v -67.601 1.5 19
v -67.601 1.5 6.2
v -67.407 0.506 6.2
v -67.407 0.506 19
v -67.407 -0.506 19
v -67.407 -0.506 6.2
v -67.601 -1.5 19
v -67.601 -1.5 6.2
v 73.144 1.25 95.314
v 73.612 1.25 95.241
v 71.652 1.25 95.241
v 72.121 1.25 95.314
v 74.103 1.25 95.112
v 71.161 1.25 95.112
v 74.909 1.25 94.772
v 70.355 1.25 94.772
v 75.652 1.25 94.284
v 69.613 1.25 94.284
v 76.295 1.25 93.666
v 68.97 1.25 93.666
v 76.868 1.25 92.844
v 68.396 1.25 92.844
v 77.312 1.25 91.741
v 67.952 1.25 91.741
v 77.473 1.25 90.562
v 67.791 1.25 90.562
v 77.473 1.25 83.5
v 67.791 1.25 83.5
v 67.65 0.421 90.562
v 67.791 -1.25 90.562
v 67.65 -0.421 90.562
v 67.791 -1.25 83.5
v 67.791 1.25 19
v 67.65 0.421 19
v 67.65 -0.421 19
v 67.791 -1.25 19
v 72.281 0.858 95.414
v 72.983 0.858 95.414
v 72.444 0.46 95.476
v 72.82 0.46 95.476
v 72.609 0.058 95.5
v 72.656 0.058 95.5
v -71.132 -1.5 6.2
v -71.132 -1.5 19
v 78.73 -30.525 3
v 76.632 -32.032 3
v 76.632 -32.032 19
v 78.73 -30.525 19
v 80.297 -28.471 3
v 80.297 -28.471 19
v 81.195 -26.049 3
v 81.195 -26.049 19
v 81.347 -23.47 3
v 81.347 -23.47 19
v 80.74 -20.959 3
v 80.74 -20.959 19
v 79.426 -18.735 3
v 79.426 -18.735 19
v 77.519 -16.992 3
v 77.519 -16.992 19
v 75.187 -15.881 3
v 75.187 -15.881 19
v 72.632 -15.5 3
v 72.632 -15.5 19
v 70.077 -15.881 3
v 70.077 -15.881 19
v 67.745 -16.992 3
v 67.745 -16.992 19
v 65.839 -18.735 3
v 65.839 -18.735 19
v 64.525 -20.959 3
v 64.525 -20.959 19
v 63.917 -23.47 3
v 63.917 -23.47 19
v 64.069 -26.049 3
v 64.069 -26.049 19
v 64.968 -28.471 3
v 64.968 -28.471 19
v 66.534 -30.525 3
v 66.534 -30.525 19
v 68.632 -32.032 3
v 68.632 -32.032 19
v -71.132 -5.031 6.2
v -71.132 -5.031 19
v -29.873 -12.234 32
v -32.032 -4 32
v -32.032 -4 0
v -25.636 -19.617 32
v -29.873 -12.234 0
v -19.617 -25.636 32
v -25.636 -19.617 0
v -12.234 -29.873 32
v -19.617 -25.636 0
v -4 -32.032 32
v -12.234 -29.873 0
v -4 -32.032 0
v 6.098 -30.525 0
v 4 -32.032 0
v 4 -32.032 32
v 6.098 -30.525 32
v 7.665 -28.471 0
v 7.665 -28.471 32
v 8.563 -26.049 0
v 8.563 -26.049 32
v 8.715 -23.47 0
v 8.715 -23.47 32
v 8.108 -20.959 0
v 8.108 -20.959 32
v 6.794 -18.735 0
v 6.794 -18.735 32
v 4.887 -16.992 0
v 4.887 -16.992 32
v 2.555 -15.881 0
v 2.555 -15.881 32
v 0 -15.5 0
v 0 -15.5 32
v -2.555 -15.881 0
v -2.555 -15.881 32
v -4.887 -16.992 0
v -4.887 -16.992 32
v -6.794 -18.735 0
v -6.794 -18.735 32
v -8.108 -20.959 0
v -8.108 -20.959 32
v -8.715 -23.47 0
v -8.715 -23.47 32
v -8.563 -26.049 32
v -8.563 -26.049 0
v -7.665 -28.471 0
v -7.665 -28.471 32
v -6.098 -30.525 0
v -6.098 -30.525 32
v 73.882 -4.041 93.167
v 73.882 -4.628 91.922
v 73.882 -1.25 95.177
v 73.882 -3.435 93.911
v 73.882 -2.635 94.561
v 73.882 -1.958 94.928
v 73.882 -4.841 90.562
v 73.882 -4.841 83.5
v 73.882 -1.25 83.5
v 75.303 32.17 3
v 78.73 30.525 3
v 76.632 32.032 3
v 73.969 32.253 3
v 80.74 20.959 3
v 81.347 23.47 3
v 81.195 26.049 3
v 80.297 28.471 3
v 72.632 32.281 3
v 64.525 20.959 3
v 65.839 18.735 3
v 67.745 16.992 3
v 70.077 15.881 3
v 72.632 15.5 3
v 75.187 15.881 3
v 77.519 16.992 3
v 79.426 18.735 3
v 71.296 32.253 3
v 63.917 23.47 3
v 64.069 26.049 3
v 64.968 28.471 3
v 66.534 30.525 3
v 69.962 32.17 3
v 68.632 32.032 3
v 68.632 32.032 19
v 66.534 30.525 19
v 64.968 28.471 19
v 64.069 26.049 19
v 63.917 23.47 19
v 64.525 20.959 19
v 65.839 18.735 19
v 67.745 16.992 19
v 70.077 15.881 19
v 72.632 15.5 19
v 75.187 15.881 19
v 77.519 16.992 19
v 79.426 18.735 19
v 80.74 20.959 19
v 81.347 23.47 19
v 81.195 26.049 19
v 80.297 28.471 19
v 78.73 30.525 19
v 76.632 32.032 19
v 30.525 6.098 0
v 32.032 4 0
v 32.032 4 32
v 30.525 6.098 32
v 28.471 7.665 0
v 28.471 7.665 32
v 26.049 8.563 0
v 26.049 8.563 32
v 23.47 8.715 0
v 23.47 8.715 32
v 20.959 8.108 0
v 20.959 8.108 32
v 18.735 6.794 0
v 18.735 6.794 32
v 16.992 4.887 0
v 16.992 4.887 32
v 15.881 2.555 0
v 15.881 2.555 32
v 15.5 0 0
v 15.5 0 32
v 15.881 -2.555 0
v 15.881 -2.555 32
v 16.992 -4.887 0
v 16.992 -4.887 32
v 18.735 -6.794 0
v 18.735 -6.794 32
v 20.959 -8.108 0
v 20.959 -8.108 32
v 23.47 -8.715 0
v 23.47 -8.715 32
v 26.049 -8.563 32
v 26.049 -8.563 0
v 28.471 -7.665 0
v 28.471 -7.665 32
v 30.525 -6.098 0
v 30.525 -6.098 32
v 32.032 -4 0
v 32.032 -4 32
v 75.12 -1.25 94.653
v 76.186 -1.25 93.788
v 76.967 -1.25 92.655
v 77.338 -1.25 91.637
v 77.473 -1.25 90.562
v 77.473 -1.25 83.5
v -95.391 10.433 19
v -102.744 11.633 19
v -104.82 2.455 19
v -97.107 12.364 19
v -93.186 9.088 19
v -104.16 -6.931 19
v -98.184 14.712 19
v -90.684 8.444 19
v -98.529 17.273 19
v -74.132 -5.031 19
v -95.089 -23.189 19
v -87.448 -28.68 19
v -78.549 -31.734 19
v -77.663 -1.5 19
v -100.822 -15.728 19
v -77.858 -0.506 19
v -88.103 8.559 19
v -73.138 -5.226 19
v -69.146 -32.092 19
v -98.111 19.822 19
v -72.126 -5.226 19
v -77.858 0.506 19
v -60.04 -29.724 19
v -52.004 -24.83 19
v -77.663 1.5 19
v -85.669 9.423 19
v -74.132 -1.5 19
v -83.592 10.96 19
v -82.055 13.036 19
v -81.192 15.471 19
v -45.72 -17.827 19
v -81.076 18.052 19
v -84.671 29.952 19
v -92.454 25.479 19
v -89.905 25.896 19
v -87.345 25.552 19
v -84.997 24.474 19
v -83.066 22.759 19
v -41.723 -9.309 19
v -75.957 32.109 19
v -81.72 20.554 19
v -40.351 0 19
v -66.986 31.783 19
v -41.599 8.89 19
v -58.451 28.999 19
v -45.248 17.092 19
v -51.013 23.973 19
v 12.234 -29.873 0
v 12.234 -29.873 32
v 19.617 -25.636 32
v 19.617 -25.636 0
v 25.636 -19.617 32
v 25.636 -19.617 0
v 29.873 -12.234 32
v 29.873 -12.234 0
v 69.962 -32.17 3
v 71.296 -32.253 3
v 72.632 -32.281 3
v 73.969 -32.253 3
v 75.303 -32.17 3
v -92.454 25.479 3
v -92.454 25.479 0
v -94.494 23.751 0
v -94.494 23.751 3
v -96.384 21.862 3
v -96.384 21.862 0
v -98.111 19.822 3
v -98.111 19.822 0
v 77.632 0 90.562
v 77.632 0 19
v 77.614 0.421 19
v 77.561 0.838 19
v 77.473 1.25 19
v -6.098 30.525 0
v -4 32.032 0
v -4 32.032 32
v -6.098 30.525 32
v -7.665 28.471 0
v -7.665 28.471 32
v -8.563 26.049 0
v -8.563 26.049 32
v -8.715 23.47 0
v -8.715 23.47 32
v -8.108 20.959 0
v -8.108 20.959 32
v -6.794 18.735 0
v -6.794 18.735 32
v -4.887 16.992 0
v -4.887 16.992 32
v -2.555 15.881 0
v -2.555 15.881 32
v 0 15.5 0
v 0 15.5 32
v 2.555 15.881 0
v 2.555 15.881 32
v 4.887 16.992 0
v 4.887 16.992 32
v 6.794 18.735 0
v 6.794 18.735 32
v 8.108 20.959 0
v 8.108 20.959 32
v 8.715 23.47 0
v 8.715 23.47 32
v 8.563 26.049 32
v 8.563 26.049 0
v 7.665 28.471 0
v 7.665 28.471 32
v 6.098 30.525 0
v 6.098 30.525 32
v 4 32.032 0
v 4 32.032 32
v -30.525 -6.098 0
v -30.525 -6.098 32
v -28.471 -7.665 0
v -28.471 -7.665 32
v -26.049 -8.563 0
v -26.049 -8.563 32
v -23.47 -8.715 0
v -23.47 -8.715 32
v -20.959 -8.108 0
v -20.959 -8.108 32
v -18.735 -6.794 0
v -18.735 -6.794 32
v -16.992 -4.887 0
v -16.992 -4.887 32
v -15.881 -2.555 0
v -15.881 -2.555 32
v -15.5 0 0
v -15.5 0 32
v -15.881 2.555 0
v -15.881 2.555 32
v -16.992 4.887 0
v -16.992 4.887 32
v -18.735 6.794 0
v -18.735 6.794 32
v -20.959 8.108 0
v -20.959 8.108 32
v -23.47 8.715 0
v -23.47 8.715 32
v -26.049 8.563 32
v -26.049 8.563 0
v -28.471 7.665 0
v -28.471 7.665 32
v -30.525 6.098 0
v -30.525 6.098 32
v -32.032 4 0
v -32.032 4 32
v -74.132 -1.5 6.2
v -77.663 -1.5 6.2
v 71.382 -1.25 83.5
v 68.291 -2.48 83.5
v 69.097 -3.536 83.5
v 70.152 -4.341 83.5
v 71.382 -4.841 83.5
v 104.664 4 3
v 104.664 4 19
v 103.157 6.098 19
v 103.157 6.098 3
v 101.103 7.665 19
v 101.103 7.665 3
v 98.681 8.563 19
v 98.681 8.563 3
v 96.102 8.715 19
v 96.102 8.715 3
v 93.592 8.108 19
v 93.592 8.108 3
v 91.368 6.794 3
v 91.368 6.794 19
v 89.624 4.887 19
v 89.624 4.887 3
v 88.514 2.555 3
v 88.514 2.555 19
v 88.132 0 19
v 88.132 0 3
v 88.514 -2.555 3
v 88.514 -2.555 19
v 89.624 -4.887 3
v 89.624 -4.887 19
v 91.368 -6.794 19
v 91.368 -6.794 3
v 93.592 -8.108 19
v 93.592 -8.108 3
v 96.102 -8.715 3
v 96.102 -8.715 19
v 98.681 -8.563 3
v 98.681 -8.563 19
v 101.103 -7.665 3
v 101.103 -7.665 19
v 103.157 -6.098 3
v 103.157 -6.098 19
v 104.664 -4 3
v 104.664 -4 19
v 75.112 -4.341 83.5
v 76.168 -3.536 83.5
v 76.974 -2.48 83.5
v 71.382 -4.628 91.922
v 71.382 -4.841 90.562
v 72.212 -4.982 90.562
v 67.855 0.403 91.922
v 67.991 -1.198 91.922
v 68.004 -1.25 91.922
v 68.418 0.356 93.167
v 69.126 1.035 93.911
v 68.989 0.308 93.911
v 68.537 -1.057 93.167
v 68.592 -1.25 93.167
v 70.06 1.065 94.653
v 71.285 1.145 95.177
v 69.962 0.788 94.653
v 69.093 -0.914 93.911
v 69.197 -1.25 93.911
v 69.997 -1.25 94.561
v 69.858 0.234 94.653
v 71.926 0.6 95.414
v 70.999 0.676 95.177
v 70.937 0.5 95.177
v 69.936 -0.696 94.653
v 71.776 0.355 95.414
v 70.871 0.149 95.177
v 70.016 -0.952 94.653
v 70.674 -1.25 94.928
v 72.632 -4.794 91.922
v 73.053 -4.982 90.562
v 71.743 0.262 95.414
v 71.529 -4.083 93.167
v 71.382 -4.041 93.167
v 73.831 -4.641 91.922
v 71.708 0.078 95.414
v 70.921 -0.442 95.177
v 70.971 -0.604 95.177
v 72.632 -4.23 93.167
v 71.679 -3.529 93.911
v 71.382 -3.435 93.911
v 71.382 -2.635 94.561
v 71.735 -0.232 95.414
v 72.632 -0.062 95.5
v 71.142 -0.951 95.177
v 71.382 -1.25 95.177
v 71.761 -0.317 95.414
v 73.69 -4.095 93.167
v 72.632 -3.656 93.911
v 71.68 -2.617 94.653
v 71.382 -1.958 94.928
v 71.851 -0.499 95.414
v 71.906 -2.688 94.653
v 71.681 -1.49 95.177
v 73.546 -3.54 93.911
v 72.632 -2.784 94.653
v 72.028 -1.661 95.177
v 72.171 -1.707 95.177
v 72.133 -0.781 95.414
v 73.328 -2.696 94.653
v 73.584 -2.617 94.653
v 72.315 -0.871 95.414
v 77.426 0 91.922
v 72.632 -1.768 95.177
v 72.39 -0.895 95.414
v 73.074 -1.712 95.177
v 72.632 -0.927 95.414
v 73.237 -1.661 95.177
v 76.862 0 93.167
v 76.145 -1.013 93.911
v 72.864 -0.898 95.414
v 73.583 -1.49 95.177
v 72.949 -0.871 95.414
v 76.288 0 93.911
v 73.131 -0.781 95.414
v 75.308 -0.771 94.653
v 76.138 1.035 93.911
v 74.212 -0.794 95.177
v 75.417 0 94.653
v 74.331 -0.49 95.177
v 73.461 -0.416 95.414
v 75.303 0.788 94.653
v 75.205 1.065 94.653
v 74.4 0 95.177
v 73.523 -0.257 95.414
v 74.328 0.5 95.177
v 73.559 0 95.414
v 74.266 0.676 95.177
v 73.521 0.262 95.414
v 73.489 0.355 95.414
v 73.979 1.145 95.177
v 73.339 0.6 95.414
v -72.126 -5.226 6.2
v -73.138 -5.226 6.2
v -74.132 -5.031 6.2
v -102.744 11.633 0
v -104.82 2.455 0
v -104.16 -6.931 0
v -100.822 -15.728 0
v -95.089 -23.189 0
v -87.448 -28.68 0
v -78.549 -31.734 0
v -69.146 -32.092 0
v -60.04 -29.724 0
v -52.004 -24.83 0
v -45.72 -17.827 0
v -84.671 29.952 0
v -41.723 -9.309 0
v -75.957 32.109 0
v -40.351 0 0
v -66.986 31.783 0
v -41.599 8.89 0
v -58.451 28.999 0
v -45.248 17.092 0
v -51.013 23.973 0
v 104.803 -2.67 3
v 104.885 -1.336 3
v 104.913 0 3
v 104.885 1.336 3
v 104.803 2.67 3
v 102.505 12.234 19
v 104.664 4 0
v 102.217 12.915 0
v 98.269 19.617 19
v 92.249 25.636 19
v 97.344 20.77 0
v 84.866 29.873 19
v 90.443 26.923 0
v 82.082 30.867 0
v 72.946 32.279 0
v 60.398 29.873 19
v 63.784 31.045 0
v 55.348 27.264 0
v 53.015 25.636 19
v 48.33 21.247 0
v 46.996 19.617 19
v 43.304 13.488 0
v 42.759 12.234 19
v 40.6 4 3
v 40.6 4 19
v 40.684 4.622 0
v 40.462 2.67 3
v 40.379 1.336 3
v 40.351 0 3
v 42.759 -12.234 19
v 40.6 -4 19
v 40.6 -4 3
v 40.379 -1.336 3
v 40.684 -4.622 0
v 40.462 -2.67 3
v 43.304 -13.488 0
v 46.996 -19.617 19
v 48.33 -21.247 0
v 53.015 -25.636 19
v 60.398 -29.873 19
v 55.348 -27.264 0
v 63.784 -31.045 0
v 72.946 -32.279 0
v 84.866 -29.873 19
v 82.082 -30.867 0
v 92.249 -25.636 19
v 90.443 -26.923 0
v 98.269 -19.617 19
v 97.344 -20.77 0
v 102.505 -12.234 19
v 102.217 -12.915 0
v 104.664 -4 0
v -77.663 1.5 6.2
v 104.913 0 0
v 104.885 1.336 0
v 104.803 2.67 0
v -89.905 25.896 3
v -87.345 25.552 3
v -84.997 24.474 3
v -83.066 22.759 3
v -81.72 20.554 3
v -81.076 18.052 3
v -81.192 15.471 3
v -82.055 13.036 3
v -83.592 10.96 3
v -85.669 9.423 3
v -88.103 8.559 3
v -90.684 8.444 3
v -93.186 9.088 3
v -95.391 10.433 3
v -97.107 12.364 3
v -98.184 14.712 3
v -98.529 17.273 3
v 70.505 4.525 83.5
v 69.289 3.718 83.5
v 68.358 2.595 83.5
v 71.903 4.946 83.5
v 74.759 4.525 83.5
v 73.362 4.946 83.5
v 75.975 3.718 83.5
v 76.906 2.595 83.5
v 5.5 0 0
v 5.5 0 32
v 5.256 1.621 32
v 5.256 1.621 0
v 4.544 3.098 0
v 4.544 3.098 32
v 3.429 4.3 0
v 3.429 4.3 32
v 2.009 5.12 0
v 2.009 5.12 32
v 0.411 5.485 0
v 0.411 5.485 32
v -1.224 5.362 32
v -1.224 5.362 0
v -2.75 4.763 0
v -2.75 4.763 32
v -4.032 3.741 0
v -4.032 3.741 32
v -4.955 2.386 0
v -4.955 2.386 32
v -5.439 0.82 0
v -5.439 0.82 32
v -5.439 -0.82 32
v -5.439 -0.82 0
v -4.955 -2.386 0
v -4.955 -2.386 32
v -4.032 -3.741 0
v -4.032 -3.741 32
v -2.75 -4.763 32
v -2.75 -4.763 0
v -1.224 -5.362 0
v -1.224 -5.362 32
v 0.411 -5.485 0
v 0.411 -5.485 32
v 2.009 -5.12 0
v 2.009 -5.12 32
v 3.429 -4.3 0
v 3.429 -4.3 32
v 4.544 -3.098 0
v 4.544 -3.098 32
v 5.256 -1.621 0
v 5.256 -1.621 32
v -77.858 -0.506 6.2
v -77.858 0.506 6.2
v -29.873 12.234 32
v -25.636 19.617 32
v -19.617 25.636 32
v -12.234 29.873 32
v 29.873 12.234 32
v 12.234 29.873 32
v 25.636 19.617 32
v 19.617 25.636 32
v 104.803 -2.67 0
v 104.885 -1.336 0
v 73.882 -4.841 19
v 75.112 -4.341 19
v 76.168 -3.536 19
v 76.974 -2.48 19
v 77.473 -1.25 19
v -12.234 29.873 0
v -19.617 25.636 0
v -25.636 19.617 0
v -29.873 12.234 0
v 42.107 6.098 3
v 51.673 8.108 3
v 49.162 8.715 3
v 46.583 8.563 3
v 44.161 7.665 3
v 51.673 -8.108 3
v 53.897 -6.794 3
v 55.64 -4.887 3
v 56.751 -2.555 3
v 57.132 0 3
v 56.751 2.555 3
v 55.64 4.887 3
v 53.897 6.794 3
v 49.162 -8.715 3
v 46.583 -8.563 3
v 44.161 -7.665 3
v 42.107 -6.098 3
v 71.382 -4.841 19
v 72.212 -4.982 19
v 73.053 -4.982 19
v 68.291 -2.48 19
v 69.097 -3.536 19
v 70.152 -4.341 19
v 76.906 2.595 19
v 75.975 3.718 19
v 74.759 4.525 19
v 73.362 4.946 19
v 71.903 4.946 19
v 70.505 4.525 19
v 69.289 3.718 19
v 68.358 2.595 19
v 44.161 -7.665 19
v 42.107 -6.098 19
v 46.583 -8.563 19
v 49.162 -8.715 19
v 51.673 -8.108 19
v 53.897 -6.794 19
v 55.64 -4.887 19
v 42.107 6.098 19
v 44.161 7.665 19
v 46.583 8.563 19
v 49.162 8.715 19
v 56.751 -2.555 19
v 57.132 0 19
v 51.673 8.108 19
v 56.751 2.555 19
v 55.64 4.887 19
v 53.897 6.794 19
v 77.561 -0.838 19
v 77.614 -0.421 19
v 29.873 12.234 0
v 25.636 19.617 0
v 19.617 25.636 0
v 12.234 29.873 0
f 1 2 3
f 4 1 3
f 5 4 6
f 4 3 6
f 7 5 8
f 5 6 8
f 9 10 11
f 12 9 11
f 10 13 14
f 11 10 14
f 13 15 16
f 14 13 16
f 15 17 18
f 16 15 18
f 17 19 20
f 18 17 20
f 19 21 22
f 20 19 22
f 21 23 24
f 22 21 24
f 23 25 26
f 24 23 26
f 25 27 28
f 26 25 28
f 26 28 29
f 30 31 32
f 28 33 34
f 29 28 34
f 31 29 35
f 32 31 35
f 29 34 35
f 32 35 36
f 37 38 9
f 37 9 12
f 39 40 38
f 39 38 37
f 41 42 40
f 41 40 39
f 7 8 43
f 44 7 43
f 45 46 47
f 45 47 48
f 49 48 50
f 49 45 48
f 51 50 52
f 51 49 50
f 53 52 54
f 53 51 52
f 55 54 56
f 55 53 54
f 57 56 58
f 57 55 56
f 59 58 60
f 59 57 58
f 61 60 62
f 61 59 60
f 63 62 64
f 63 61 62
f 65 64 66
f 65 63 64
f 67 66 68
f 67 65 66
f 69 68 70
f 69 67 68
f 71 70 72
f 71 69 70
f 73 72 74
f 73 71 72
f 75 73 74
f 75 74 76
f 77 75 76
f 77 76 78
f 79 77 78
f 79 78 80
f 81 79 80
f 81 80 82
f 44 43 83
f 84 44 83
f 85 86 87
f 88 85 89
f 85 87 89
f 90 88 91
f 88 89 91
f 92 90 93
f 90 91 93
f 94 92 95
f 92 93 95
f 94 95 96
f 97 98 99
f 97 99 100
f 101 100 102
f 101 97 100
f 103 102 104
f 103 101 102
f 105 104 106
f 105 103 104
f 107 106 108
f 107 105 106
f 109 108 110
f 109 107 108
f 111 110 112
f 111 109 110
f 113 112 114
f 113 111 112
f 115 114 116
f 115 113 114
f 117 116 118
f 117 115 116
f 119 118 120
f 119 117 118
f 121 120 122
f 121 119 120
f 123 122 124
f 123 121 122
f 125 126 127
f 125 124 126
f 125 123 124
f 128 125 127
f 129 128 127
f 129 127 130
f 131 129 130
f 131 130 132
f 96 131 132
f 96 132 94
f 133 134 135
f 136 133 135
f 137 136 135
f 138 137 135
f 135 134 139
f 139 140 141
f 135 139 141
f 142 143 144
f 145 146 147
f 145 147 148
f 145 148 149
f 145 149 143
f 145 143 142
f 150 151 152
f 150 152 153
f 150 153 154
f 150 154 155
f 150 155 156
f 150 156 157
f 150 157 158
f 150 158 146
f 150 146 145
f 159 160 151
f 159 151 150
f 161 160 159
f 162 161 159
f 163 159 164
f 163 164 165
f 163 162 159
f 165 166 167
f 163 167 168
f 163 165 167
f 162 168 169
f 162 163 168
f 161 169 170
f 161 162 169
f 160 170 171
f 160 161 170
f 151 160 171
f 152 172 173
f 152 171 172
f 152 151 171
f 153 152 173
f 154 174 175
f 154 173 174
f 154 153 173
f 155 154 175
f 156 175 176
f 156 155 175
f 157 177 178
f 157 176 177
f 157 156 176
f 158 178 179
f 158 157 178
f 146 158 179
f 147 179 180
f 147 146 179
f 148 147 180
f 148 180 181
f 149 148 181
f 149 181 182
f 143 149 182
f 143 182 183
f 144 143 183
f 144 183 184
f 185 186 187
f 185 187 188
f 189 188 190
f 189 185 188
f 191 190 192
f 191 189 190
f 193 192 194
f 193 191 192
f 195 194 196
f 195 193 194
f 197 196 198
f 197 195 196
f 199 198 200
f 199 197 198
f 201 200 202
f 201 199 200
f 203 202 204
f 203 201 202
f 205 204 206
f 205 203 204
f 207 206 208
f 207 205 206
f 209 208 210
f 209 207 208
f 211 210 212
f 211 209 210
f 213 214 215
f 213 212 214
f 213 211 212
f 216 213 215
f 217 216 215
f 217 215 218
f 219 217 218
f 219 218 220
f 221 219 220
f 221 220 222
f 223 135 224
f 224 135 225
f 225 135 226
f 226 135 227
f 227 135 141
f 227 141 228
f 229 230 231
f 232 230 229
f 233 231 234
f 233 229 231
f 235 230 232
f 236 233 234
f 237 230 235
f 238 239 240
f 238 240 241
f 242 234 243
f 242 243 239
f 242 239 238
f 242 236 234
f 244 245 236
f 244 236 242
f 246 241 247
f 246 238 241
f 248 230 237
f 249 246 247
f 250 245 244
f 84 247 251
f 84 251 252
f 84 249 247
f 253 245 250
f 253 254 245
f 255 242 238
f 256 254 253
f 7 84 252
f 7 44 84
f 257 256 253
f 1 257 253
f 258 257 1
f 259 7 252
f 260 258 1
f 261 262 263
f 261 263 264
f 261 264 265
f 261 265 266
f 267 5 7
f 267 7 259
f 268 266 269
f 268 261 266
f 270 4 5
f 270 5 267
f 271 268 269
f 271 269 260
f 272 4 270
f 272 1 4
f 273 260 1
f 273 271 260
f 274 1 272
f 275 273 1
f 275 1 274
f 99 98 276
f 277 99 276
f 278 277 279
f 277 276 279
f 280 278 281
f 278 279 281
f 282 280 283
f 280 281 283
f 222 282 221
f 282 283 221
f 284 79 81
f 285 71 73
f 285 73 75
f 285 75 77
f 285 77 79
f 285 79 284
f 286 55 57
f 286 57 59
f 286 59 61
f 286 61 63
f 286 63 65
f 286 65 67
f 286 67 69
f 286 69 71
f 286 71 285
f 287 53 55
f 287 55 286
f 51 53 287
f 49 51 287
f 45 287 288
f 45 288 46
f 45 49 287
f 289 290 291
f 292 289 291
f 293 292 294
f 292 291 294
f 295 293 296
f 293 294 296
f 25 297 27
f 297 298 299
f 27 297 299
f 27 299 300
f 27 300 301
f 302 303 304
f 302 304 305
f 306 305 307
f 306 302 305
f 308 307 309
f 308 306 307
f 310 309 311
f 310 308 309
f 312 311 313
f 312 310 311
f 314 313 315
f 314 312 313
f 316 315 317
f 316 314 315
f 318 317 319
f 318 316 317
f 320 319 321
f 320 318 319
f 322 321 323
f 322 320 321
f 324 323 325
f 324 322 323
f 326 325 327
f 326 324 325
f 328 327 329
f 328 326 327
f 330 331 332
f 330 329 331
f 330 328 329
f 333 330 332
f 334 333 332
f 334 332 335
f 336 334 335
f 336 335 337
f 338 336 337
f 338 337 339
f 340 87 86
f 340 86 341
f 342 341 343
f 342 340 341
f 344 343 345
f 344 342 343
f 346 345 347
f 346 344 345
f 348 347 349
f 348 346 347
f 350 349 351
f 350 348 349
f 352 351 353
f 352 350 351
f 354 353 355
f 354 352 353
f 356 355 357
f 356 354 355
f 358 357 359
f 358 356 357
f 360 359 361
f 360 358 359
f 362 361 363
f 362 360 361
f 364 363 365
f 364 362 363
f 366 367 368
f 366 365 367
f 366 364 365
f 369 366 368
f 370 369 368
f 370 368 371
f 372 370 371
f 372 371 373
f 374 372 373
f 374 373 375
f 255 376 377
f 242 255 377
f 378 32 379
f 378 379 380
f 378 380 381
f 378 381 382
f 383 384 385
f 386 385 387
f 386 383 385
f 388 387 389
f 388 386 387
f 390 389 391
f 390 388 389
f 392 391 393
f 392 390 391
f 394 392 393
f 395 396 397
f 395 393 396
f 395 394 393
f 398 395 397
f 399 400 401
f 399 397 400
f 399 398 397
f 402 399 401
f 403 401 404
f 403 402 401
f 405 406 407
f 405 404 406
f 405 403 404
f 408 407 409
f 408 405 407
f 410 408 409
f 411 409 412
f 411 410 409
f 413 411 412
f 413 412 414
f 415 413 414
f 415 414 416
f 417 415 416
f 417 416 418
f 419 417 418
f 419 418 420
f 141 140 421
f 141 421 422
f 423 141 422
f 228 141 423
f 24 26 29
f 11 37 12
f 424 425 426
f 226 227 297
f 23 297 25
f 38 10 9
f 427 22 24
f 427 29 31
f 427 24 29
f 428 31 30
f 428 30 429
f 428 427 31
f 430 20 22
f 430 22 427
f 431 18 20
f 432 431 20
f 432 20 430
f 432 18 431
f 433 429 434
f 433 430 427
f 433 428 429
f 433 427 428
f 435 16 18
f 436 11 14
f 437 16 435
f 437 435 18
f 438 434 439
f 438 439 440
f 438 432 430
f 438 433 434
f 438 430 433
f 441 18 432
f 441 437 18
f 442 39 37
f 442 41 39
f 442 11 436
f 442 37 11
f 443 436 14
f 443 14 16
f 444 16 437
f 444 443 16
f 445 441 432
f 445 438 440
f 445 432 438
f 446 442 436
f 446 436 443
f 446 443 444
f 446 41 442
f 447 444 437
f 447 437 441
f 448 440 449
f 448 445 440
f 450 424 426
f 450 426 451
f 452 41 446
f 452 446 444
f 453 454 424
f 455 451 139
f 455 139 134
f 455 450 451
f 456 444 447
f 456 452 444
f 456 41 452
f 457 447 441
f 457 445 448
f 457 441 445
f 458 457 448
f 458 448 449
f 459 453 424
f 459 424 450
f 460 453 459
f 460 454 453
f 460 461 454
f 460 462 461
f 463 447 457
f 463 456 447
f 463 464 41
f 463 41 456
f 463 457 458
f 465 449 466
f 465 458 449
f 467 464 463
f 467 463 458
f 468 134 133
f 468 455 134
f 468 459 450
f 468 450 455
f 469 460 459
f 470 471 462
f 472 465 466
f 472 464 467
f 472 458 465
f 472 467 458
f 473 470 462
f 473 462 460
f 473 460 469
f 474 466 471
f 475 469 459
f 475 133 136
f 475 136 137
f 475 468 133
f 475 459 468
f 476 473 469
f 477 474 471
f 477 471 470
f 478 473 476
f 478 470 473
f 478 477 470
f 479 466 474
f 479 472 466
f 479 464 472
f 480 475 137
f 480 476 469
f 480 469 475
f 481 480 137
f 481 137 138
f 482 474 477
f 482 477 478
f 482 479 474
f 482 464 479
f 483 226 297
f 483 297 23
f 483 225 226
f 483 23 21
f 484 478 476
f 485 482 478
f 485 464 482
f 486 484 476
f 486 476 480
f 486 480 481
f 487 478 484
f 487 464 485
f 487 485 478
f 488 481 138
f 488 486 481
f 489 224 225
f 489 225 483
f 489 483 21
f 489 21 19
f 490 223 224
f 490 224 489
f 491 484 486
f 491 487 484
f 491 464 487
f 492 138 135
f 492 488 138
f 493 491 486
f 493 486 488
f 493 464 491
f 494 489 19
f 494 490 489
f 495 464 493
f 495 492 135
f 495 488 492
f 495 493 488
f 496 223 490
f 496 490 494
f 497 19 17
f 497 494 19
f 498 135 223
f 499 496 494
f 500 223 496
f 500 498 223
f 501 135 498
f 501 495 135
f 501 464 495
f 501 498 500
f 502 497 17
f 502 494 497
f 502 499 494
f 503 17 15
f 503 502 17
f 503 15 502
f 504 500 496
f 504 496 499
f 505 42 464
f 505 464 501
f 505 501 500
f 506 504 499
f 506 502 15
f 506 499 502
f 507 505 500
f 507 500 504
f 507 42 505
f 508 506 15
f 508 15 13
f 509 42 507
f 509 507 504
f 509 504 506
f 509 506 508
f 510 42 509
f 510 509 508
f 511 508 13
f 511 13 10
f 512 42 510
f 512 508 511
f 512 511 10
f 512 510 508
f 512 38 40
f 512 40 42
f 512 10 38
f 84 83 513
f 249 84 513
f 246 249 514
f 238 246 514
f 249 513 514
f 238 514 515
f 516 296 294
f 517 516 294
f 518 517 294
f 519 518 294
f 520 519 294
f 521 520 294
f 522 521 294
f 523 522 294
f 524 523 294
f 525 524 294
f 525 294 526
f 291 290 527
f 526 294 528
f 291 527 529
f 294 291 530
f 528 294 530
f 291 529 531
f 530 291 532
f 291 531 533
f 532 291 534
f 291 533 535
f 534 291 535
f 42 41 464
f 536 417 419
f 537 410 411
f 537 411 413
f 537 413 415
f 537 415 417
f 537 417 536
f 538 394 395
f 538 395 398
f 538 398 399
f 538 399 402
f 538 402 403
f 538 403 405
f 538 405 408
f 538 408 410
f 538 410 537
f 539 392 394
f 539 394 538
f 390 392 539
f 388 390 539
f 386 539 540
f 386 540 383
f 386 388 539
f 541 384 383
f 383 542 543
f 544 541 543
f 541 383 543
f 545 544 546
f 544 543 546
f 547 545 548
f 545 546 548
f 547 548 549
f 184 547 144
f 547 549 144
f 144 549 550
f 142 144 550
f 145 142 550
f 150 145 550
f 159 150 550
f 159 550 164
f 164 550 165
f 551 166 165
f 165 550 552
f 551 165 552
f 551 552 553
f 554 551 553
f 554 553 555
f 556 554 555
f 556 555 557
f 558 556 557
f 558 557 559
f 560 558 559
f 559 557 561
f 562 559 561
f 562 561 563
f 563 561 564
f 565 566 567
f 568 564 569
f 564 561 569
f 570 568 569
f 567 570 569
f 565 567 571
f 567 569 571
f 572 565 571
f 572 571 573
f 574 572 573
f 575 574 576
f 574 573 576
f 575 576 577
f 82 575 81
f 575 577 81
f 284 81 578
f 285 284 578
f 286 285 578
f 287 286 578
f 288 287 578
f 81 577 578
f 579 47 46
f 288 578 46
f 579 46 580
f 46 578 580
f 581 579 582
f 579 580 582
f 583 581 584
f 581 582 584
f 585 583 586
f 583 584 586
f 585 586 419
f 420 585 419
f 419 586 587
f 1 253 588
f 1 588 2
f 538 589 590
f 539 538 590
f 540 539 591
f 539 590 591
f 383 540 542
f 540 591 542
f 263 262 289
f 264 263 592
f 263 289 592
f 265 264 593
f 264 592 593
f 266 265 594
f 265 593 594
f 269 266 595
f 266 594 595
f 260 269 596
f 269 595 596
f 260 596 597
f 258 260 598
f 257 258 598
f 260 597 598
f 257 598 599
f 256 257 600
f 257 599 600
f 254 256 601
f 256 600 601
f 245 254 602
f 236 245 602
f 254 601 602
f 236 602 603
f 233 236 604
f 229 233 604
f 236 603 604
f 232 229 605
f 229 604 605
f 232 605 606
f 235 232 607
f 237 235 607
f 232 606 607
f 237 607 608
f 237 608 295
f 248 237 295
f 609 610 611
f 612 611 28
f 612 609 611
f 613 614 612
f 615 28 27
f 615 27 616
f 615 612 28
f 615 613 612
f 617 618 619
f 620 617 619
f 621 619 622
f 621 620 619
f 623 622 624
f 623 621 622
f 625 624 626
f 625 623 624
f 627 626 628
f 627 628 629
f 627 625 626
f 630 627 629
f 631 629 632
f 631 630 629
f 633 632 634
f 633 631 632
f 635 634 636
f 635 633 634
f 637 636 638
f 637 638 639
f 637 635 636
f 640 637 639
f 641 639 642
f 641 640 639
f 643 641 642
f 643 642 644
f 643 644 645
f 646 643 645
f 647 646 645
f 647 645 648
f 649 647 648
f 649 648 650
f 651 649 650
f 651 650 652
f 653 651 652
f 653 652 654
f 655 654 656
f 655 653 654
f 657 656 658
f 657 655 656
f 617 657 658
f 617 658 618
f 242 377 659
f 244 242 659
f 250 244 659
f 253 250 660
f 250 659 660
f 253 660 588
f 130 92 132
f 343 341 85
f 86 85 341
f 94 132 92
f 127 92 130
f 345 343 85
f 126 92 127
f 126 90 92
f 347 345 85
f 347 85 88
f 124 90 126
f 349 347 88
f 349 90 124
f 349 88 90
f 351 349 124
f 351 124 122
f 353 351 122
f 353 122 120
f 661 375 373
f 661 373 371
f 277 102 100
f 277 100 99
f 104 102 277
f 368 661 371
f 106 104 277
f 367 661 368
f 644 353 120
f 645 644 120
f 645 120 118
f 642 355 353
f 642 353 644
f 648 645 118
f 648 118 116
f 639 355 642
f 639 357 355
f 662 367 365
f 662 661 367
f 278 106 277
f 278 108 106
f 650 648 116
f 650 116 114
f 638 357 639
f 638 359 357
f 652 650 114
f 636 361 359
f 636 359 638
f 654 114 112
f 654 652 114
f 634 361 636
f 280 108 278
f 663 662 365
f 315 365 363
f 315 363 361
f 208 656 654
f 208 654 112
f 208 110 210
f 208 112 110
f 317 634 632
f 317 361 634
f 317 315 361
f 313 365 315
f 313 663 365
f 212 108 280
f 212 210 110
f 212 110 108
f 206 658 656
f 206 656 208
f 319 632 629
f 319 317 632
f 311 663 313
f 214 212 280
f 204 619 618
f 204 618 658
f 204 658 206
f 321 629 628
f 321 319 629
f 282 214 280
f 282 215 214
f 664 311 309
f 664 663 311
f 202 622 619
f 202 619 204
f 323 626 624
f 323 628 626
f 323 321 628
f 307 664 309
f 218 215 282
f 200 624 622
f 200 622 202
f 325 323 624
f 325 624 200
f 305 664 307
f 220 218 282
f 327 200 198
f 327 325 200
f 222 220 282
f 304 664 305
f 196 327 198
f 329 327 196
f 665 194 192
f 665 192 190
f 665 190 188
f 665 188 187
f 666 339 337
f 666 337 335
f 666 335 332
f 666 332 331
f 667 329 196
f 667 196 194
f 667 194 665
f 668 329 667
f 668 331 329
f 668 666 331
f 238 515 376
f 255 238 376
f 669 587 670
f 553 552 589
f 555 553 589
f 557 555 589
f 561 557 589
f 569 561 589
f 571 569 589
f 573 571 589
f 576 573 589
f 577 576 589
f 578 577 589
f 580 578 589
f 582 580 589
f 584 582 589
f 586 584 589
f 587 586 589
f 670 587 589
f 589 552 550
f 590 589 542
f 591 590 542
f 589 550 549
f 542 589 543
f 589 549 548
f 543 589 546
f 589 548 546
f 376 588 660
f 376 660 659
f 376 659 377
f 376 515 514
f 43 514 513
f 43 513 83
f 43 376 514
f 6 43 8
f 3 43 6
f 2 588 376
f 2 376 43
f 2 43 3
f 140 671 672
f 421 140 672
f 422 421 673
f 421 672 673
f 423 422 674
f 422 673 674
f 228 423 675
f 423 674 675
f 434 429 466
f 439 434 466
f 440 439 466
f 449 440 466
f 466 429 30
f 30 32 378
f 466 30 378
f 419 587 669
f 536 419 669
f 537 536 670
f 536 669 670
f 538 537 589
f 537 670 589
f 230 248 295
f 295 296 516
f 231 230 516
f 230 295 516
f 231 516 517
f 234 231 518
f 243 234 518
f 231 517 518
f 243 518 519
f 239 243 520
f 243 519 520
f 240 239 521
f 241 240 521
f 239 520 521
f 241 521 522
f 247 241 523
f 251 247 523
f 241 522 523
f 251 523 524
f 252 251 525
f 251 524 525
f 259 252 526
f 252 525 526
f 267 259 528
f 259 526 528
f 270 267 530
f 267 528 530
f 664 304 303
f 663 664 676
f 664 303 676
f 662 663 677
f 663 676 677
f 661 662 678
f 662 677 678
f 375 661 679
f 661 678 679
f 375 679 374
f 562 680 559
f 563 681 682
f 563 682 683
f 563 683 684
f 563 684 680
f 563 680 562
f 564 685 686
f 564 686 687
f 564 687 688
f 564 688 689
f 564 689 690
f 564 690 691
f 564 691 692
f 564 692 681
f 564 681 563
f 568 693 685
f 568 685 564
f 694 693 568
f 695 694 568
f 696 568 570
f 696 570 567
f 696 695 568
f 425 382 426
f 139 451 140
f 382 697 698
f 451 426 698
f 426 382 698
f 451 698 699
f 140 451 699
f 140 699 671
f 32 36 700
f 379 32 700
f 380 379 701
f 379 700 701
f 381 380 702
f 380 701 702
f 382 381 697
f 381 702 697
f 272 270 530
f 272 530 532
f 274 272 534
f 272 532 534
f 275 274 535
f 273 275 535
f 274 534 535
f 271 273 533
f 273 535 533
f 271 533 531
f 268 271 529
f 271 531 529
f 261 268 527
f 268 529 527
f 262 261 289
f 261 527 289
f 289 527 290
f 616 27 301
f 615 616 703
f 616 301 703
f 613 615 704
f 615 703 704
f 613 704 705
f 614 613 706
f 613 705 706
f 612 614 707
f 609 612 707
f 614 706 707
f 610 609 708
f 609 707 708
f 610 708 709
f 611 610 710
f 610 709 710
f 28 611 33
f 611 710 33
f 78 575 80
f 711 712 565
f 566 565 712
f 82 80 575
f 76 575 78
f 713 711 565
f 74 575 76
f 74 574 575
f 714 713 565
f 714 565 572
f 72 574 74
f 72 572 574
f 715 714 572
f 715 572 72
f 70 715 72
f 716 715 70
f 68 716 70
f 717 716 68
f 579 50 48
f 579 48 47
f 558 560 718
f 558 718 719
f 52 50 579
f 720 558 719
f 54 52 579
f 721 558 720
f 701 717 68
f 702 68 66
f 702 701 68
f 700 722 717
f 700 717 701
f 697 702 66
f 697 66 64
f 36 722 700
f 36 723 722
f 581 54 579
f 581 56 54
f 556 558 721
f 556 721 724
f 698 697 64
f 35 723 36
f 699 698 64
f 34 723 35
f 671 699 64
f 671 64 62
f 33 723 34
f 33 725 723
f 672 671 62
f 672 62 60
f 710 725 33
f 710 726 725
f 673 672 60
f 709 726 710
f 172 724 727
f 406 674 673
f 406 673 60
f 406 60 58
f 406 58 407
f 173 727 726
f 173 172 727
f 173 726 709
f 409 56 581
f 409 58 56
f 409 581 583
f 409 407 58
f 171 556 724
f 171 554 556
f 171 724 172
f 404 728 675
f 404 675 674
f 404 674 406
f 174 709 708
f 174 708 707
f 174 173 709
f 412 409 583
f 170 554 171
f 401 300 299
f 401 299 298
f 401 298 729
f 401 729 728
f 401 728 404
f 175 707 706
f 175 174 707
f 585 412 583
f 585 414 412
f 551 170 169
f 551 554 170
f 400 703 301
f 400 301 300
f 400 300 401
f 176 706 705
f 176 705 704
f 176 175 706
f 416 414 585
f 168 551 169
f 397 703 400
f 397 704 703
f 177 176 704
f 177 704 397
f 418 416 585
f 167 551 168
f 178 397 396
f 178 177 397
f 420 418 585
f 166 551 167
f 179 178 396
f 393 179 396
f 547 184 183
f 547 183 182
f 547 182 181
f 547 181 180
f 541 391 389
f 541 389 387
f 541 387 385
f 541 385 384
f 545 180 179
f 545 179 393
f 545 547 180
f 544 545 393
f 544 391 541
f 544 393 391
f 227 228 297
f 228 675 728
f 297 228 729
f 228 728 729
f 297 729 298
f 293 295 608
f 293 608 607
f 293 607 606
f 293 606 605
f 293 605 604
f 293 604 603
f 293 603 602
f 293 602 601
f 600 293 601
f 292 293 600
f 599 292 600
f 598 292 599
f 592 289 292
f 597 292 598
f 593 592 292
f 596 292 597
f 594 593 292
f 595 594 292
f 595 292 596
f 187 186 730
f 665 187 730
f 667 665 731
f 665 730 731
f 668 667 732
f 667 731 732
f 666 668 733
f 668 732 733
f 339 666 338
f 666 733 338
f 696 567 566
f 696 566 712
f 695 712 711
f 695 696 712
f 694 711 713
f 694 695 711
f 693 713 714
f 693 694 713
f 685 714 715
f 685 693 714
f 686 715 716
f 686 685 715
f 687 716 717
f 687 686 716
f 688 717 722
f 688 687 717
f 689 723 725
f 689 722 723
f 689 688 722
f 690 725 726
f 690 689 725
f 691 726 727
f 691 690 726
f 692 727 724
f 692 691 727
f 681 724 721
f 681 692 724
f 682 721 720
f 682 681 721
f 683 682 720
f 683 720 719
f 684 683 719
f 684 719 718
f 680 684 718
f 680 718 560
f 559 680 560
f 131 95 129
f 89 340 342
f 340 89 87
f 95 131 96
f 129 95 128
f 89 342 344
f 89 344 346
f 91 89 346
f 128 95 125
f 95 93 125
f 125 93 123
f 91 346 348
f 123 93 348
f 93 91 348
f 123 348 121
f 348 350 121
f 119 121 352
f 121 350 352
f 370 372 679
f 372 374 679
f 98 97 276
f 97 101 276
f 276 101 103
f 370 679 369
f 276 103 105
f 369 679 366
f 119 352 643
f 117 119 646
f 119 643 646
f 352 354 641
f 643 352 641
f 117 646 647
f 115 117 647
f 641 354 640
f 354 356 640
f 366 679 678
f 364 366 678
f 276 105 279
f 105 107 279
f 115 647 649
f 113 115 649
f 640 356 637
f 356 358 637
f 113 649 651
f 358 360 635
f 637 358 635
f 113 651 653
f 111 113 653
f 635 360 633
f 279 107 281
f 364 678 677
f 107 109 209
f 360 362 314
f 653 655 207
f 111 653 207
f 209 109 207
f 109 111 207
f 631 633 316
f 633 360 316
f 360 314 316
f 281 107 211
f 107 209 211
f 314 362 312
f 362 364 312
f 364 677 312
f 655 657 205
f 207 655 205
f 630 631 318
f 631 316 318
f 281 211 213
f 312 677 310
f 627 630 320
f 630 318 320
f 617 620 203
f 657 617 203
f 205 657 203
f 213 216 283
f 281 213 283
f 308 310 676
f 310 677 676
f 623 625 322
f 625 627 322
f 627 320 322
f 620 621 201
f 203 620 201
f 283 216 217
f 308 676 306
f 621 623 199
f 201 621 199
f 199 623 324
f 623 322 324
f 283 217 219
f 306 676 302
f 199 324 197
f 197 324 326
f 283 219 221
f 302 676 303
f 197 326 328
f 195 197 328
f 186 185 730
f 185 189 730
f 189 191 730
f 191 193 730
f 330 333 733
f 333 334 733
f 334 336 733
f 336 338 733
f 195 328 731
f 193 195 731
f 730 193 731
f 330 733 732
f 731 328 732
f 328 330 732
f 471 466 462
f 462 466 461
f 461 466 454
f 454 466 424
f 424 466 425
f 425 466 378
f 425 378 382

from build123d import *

# Parameters (mm, degrees)
F3_R             = 5.5
F6_DEPTH         = 32
F7_DEPTH         = 32.001
F7_COPIES_COUNT  = 4
F8_DEPTH         = 19
F9_DEPTH         = 95.5
F10_DEPTH        = 83.5
F11_T2_ANGLE     = 315.5011633423
F11_T4_ANGLE     = 315.5011633423
F11_T6_ANGLE     = 315.5011633423
F12_START        = 3
F12_DEPTH        = 92.5010001001
F12_COPIES_COUNT = 4
F13_START        = 3
F13_DEPTH        = 92.5010001001
F14_DEPTH        = 19
F15_DEPTH        = 6.2
F16_DEPTH        = 3


# Not quite as in the source:
# - a fillet or chamfer that OpenCascade refuses, or shapes differently, is made with other operations: its cross-section is extruded or revolved along the edge and cut away or added
# - a pattern or mirror of a feature is missing from the dataset's text; its kind, count and spacing are read off the source's solid
# - a feature names something its author has since deleted; it is built from what else it names


with BuildPart() as f6:
    # F3 (on Top) → F6 (new body)
    with BuildSketch(Plane.XY):
        with BuildLine():
            ThreePointArc((32.0321912081, -4), (15.5, 0), (32.0321912081, 4))
            ThreePointArc((32.0321912081, 4), (-32.2809738638, 0), (32.0321912081, -4))
        make_face()
        Circle(F3_R, mode=Mode.SUBTRACT)
        with BuildLine():
            ThreePointArc((32.2809738638, 0), (32.218718168, 2.0038645669), (32.0321912081, 4))
            ThreePointArc((32.0321912081, 4), (15.5, 0), (32.0321912081, -4))
            ThreePointArc((32.0321912081, -4), (32.218718168, -2.0038645669), (32.2809738638, 0))
        make_face()
    extrude(amount=F6_DEPTH)

    # F3 (on Top) → F7 (cut, through all)
    with BuildSketch(Plane.XY):
        with BuildLine():
            ThreePointArc((32.2809738638, 0), (32.218718168, 2.0038645669), (32.0321912081, 4))
            ThreePointArc((32.0321912081, 4), (15.5, 0), (32.0321912081, -4))
            ThreePointArc((32.0321912081, -4), (32.218718168, -2.0038645669), (32.2809738638, 0))
        make_face()
    f7 = extrude(amount=F7_DEPTH, mode=Mode.SUBTRACT)

    # F7_copies: F7 ×4 about axis
    f7_copies_axis = Axis((0, 0, 0), (0, 0, 1))
    for i in range(1, F7_COPIES_COUNT):
        add(f7.rotate(f7_copies_axis, i * 360 / F7_COPIES_COUNT), mode=Mode.SUBTRACT)

    # F3 (on Top) → F13 (cut)
    with BuildSketch(Plane.XY.offset(F13_START)):
        with BuildLine():
            ThreePointArc((104.6643824017, -4), (104.8509093616, -2.0038645669), (104.9131650573, 0))
            ThreePointArc((104.9131650573, 0), (104.8509093616, 2.0038645669), (104.6643824017, 4))
            ThreePointArc((104.6643824017, 4), (88.1321911935, 0), (104.6643824017, -4))
        make_face()
    extrude(amount=F13_DEPTH, mode=Mode.SUBTRACT)


with BuildPart() as f8:
    # F3 (on Top) → F8 (new body)
    with BuildSketch(Plane.XY):
        with BuildLine():
            ThreePointArc((104.6643824017, -4), (88.1321911935, 0), (104.6643824017, 4))
            ThreePointArc((104.6643824017, 4), (40.3512173297, 0), (104.6643824017, -4))
        make_face()
        with BuildLine():
            ThreePointArc((77.4734203763, 1.25), (77.5923396749, 0.6300214624), (77.6321911935, 0))
            ThreePointArc((77.6321911935, 0), (77.5923396749, -0.6300214624), (77.4734203763, -1.25))
            ThreePointArc((77.4734203763, -1.25), (76.1677250995, -3.5355339059), (73.8821911935, -4.8412291828))
            ThreePointArc((73.8821911935, -4.8412291828), (72.6321911935, -5), (71.3821911935, -4.8412291828))
            ThreePointArc((71.3821911935, -4.8412291828), (69.0966572876, -3.5355339059), (67.7909620108, -1.25))
            ThreePointArc((67.7909620108, -1.25), (67.6321911935, 0), (67.7909620108, 1.25))
            ThreePointArc((67.7909620108, 1.25), (72.6321911935, 5), (77.4734203763, 1.25))
        make_face(mode=Mode.SUBTRACT)
        with BuildLine():
            ThreePointArc((73.8821911935, -4.8412291828), (76.1677250995, -3.5355339059), (77.4734203763, -1.25))
            Line((77.4734203763, -1.25), (73.8821911935, -1.25))
            Line((73.8821911935, -1.25), (73.8821911935, -4.8412291828))
        make_face()
        with BuildLine():
            Line((71.3821911935, -1.25), (67.7909620108, -1.25))
            ThreePointArc((67.7909620108, -1.25), (69.0966572876, -3.5355339059), (71.3821911935, -4.8412291828))
            Line((71.3821911935, -4.8412291828), (71.3821911935, -1.25))
        make_face()
        with BuildLine():
            ThreePointArc((104.6643824017, -4), (104.8509093616, -2.0038645669), (104.9131650573, 0))
            ThreePointArc((104.9131650573, 0), (104.8509093616, 2.0038645669), (104.6643824017, 4))
            ThreePointArc((104.6643824017, 4), (88.1321911935, 0), (104.6643824017, -4))
        make_face()
    extrude(amount=F8_DEPTH)

    # F3 (on Top) → F9 (join)
    with BuildSketch(Plane.XY):
        with BuildLine():
            ThreePointArc((77.4734203763, -1.25), (77.5923396749, -0.6300214624), (77.6321911935, 0))
            ThreePointArc((77.6321911935, 0), (77.5923396749, 0.6300214624), (77.4734203763, 1.25))
            Line((77.4734203763, 1.25), (67.7909620108, 1.25))
            ThreePointArc((67.7909620108, 1.25), (67.6321911935, 0), (67.7909620108, -1.25))
            Line((67.7909620108, -1.25), (71.3821911935, -1.25))
            Line((71.3821911935, -1.25), (71.3821911935, -4.8412291828))
            ThreePointArc((71.3821911935, -4.8412291828), (72.6321911935, -5), (73.8821911935, -4.8412291828))
            Line((73.8821911935, -4.8412291828), (73.8821911935, -1.25))
            Line((73.8821911935, -1.25), (77.4734203763, -1.25))
        make_face()
    extrude(amount=F9_DEPTH)

    # F3 (on Top) → F10 (join)
    with BuildSketch(Plane.XY):
        with BuildLine():
            Line((71.3821911935, -1.25), (67.7909620108, -1.25))
            ThreePointArc((67.7909620108, -1.25), (69.0966572876, -3.5355339059), (71.3821911935, -4.8412291828))
            Line((71.3821911935, -4.8412291828), (71.3821911935, -1.25))
        make_face()
        with BuildLine():
            ThreePointArc((73.8821911935, -4.8412291828), (76.1677250995, -3.5355339059), (77.4734203763, -1.25))
            Line((77.4734203763, -1.25), (73.8821911935, -1.25))
            Line((73.8821911935, -1.25), (73.8821911935, -4.8412291828))
        make_face()
        with BuildLine():
            Line((67.7909620108, 1.25), (77.4734203763, 1.25))
            ThreePointArc((77.4734203763, 1.25), (72.6321911935, 5), (67.7909620108, 1.25))
        make_face()
    extrude(amount=F10_DEPTH)

    # F11: fillet of radius 5 on 3 edges, made by hand

    # F11_s1 → F11_t2 (revolve, cut)
    with BuildSketch(Plane(origin=(62.2190839151, 25.4537619139, 0), x_dir=(0, 0, 1), z_dir=(0.925544348, 0.3786392212, 0))):
        with BuildLine():
            ThreePointArc((90.4990343146, 22.5009963057), (94.0351924681, 23.9655209949), (95.5003999068, 27.5013963057))
            Line((95.5003999068, 27.5013963057), (96.0005364913, 27.5013963057))
            Line((96.0005364913, 27.5013963057), (96.0001365685, 22.5013963057))
            Line((96.0001365685, 22.5013963057), (95.5, 22.0012597372))
            ThreePointArc((95.5, 22.0012597372), (92.9995171573, 22.0012597372), (90.4990343146, 22.0008597372))
            Line((90.4990343146, 22.0008597372), (90.4990343146, 22.5009963057))
        make_face()
    revolve(axis=Axis((72.6321911935, 0, 95.5), (0, 0, 1)), revolution_arc=F11_T2_ANGLE, mode=Mode.SUBTRACT)

    # F11_s3 → F11_t4 (revolve, cut)
    with BuildSketch(Plane(origin=(10.4131072784, -25.453761914, 0), x_dir=(0, 0, 1), z_dir=(0.3786392212, -0.925544348, 0))):
        with BuildLine():
            ThreePointArc((90.4990343146, -72.2247140449), (94.0351924681, -70.7601893557), (95.5003999068, -67.2243140449))
            Line((95.5003999068, -67.2243140449), (96.0005364913, -67.2243140449))
            Line((96.0005364913, -67.2243140449), (96.0001365685, -72.2243140449))
            Line((96.0001365685, -72.2243140449), (95.5, -72.7244506135))
            ThreePointArc((95.5, -72.7244506135), (92.9995171573, -72.7244506135), (90.4990343146, -72.7248506135))
            Line((90.4990343146, -72.7248506135), (90.4990343146, -72.2247140449))
        make_face()
    revolve(axis=Axis((72.6321911935, 0, 95.5), (0, 0, 1)), revolution_arc=F11_T4_ANGLE, mode=Mode.SUBTRACT)

    # F11_s5 → F11_t6 (revolve, cut)
    with BuildSketch(Plane(origin=(10.4131072784, 25.453761914, 0), x_dir=(0, 0, 1), z_dir=(-0.3786392212, -0.925544348, 0))):
        with BuildLine():
            ThreePointArc((90.4990343146, -62.2239140449), (94.0351924681, -63.6884387341), (95.5003999068, -67.2243140449))
            Line((95.5003999068, -67.2243140449), (96.0005364913, -67.2243140449))
            Line((96.0005364913, -67.2243140449), (96.0001365685, -62.2243140449))
            Line((96.0001365685, -62.2243140449), (95.5, -61.7241774764))
            ThreePointArc((95.5, -61.7241774764), (92.9995171573, -61.7241774764), (90.4990343146, -61.7237774764))
            Line((90.4990343146, -61.7237774764), (90.4990343146, -62.2239140449))
        make_face()
    revolve(axis=Axis((72.6321911935, 0, 95.5), (0, 0, -1)), revolution_arc=F11_T6_ANGLE, mode=Mode.SUBTRACT)

    # F3 (on Top) → F12 (cut)
    with BuildSketch(Plane.XY.offset(F12_START)):
        with BuildLine():
            ThreePointArc((104.6643824017, -4), (104.8509093616, -2.0038645669), (104.9131650573, 0))
            ThreePointArc((104.9131650573, 0), (104.8509093616, 2.0038645669), (104.6643824017, 4))
            ThreePointArc((104.6643824017, 4), (88.1321911935, 0), (104.6643824017, -4))
        make_face()
    f12 = extrude(amount=F12_DEPTH, mode=Mode.SUBTRACT)

    # F12_copies: F12 ×4 about axis
    f12_copies_axis = Axis((72.632191, 0, 0), (0, 0, 1))
    for i in range(1, F12_COPIES_COUNT):
        add(f12.rotate(f12_copies_axis, i * 360 / F12_COPIES_COUNT), mode=Mode.SUBTRACT)


with BuildPart() as f14:
    # F3 (on Top) → F14 (new body)
    with BuildSketch(Plane.XY):
        with BuildLine():
            ThreePointArc((-98.1107979378, 19.8217524948), (-83.1104313892, -30.5330600497), (-40.3512173297, 0))
            ThreePointArc((-40.3512173297, 0), (-58.4512920793, 28.9993685088), (-92.4539436883, 25.4786067443))
            ThreePointArc((-92.4539436883, 25.4786067443), (-83.5923463019, 10.9601551084), (-98.1107979378, 19.8217524948))
        make_face()
        with BuildLine():
            Line((-71.1321911935, 1.5), (-67.6010382442, 1.5))
            ThreePointArc((-67.6010382442, 1.5), (-67.3821911935, 0), (-67.6010382442, -1.5))
            Line((-67.6010382442, -1.5), (-71.1321911935, -1.5))
            Line((-71.1321911935, -1.5), (-71.1321911935, -5.0311529494))
            ThreePointArc((-71.1321911935, -5.0311529494), (-72.6321911935, -5.25), (-74.1321911935, -5.0311529494))
            Line((-74.1321911935, -5.0311529494), (-74.1321911935, -1.5))
            Line((-74.1321911935, -1.5), (-77.6633441429, -1.5))
            ThreePointArc((-77.6633441429, -1.5), (-77.8821911935, 0), (-77.6633441429, 1.5))
            Line((-77.6633441429, 1.5), (-74.1321911935, 1.5))
            Line((-74.1321911935, 1.5), (-71.1321911935, 1.5))
        make_face(mode=Mode.SUBTRACT)
    extrude(amount=F14_DEPTH)

    # F3 (on Top) → F15 (join)
    with BuildSketch(Plane.XY):
        with BuildLine():
            ThreePointArc((-67.6010382442, -1.5), (-67.3821911935, 0), (-67.6010382442, 1.5))
            Line((-67.6010382442, 1.5), (-71.1321911935, 1.5))
            Line((-71.1321911935, 1.5), (-74.1321911935, 1.5))
            Line((-74.1321911935, 1.5), (-77.6633441429, 1.5))
            ThreePointArc((-77.6633441429, 1.5), (-77.8821911935, 0), (-77.6633441429, -1.5))
            Line((-77.6633441429, -1.5), (-74.1321911935, -1.5))
            Line((-74.1321911935, -1.5), (-74.1321911935, -5.0311529494))
            ThreePointArc((-74.1321911935, -5.0311529494), (-72.6321911935, -5.25), (-71.1321911935, -5.0311529494))
            Line((-71.1321911935, -5.0311529494), (-71.1321911935, -1.5))
            Line((-71.1321911935, -1.5), (-67.6010382442, -1.5))
        make_face()
    extrude(amount=F15_DEPTH)

    # F3 (on Top) → F16 (join)
    with BuildSketch(Plane.XY):
        with BuildLine():
            ThreePointArc((-98.1107979378, 19.8217524948), (-83.5923463019, 10.9601551084), (-92.4539436883, 25.4786067443))
            ThreePointArc((-92.4539436883, 25.4786067443), (-95.4582867159, 22.8260955224), (-98.1107979378, 19.8217524948))
        make_face()
    extrude(amount=F16_DEPTH)


solid = Compound([f6.part, f8.part, f14.part])
